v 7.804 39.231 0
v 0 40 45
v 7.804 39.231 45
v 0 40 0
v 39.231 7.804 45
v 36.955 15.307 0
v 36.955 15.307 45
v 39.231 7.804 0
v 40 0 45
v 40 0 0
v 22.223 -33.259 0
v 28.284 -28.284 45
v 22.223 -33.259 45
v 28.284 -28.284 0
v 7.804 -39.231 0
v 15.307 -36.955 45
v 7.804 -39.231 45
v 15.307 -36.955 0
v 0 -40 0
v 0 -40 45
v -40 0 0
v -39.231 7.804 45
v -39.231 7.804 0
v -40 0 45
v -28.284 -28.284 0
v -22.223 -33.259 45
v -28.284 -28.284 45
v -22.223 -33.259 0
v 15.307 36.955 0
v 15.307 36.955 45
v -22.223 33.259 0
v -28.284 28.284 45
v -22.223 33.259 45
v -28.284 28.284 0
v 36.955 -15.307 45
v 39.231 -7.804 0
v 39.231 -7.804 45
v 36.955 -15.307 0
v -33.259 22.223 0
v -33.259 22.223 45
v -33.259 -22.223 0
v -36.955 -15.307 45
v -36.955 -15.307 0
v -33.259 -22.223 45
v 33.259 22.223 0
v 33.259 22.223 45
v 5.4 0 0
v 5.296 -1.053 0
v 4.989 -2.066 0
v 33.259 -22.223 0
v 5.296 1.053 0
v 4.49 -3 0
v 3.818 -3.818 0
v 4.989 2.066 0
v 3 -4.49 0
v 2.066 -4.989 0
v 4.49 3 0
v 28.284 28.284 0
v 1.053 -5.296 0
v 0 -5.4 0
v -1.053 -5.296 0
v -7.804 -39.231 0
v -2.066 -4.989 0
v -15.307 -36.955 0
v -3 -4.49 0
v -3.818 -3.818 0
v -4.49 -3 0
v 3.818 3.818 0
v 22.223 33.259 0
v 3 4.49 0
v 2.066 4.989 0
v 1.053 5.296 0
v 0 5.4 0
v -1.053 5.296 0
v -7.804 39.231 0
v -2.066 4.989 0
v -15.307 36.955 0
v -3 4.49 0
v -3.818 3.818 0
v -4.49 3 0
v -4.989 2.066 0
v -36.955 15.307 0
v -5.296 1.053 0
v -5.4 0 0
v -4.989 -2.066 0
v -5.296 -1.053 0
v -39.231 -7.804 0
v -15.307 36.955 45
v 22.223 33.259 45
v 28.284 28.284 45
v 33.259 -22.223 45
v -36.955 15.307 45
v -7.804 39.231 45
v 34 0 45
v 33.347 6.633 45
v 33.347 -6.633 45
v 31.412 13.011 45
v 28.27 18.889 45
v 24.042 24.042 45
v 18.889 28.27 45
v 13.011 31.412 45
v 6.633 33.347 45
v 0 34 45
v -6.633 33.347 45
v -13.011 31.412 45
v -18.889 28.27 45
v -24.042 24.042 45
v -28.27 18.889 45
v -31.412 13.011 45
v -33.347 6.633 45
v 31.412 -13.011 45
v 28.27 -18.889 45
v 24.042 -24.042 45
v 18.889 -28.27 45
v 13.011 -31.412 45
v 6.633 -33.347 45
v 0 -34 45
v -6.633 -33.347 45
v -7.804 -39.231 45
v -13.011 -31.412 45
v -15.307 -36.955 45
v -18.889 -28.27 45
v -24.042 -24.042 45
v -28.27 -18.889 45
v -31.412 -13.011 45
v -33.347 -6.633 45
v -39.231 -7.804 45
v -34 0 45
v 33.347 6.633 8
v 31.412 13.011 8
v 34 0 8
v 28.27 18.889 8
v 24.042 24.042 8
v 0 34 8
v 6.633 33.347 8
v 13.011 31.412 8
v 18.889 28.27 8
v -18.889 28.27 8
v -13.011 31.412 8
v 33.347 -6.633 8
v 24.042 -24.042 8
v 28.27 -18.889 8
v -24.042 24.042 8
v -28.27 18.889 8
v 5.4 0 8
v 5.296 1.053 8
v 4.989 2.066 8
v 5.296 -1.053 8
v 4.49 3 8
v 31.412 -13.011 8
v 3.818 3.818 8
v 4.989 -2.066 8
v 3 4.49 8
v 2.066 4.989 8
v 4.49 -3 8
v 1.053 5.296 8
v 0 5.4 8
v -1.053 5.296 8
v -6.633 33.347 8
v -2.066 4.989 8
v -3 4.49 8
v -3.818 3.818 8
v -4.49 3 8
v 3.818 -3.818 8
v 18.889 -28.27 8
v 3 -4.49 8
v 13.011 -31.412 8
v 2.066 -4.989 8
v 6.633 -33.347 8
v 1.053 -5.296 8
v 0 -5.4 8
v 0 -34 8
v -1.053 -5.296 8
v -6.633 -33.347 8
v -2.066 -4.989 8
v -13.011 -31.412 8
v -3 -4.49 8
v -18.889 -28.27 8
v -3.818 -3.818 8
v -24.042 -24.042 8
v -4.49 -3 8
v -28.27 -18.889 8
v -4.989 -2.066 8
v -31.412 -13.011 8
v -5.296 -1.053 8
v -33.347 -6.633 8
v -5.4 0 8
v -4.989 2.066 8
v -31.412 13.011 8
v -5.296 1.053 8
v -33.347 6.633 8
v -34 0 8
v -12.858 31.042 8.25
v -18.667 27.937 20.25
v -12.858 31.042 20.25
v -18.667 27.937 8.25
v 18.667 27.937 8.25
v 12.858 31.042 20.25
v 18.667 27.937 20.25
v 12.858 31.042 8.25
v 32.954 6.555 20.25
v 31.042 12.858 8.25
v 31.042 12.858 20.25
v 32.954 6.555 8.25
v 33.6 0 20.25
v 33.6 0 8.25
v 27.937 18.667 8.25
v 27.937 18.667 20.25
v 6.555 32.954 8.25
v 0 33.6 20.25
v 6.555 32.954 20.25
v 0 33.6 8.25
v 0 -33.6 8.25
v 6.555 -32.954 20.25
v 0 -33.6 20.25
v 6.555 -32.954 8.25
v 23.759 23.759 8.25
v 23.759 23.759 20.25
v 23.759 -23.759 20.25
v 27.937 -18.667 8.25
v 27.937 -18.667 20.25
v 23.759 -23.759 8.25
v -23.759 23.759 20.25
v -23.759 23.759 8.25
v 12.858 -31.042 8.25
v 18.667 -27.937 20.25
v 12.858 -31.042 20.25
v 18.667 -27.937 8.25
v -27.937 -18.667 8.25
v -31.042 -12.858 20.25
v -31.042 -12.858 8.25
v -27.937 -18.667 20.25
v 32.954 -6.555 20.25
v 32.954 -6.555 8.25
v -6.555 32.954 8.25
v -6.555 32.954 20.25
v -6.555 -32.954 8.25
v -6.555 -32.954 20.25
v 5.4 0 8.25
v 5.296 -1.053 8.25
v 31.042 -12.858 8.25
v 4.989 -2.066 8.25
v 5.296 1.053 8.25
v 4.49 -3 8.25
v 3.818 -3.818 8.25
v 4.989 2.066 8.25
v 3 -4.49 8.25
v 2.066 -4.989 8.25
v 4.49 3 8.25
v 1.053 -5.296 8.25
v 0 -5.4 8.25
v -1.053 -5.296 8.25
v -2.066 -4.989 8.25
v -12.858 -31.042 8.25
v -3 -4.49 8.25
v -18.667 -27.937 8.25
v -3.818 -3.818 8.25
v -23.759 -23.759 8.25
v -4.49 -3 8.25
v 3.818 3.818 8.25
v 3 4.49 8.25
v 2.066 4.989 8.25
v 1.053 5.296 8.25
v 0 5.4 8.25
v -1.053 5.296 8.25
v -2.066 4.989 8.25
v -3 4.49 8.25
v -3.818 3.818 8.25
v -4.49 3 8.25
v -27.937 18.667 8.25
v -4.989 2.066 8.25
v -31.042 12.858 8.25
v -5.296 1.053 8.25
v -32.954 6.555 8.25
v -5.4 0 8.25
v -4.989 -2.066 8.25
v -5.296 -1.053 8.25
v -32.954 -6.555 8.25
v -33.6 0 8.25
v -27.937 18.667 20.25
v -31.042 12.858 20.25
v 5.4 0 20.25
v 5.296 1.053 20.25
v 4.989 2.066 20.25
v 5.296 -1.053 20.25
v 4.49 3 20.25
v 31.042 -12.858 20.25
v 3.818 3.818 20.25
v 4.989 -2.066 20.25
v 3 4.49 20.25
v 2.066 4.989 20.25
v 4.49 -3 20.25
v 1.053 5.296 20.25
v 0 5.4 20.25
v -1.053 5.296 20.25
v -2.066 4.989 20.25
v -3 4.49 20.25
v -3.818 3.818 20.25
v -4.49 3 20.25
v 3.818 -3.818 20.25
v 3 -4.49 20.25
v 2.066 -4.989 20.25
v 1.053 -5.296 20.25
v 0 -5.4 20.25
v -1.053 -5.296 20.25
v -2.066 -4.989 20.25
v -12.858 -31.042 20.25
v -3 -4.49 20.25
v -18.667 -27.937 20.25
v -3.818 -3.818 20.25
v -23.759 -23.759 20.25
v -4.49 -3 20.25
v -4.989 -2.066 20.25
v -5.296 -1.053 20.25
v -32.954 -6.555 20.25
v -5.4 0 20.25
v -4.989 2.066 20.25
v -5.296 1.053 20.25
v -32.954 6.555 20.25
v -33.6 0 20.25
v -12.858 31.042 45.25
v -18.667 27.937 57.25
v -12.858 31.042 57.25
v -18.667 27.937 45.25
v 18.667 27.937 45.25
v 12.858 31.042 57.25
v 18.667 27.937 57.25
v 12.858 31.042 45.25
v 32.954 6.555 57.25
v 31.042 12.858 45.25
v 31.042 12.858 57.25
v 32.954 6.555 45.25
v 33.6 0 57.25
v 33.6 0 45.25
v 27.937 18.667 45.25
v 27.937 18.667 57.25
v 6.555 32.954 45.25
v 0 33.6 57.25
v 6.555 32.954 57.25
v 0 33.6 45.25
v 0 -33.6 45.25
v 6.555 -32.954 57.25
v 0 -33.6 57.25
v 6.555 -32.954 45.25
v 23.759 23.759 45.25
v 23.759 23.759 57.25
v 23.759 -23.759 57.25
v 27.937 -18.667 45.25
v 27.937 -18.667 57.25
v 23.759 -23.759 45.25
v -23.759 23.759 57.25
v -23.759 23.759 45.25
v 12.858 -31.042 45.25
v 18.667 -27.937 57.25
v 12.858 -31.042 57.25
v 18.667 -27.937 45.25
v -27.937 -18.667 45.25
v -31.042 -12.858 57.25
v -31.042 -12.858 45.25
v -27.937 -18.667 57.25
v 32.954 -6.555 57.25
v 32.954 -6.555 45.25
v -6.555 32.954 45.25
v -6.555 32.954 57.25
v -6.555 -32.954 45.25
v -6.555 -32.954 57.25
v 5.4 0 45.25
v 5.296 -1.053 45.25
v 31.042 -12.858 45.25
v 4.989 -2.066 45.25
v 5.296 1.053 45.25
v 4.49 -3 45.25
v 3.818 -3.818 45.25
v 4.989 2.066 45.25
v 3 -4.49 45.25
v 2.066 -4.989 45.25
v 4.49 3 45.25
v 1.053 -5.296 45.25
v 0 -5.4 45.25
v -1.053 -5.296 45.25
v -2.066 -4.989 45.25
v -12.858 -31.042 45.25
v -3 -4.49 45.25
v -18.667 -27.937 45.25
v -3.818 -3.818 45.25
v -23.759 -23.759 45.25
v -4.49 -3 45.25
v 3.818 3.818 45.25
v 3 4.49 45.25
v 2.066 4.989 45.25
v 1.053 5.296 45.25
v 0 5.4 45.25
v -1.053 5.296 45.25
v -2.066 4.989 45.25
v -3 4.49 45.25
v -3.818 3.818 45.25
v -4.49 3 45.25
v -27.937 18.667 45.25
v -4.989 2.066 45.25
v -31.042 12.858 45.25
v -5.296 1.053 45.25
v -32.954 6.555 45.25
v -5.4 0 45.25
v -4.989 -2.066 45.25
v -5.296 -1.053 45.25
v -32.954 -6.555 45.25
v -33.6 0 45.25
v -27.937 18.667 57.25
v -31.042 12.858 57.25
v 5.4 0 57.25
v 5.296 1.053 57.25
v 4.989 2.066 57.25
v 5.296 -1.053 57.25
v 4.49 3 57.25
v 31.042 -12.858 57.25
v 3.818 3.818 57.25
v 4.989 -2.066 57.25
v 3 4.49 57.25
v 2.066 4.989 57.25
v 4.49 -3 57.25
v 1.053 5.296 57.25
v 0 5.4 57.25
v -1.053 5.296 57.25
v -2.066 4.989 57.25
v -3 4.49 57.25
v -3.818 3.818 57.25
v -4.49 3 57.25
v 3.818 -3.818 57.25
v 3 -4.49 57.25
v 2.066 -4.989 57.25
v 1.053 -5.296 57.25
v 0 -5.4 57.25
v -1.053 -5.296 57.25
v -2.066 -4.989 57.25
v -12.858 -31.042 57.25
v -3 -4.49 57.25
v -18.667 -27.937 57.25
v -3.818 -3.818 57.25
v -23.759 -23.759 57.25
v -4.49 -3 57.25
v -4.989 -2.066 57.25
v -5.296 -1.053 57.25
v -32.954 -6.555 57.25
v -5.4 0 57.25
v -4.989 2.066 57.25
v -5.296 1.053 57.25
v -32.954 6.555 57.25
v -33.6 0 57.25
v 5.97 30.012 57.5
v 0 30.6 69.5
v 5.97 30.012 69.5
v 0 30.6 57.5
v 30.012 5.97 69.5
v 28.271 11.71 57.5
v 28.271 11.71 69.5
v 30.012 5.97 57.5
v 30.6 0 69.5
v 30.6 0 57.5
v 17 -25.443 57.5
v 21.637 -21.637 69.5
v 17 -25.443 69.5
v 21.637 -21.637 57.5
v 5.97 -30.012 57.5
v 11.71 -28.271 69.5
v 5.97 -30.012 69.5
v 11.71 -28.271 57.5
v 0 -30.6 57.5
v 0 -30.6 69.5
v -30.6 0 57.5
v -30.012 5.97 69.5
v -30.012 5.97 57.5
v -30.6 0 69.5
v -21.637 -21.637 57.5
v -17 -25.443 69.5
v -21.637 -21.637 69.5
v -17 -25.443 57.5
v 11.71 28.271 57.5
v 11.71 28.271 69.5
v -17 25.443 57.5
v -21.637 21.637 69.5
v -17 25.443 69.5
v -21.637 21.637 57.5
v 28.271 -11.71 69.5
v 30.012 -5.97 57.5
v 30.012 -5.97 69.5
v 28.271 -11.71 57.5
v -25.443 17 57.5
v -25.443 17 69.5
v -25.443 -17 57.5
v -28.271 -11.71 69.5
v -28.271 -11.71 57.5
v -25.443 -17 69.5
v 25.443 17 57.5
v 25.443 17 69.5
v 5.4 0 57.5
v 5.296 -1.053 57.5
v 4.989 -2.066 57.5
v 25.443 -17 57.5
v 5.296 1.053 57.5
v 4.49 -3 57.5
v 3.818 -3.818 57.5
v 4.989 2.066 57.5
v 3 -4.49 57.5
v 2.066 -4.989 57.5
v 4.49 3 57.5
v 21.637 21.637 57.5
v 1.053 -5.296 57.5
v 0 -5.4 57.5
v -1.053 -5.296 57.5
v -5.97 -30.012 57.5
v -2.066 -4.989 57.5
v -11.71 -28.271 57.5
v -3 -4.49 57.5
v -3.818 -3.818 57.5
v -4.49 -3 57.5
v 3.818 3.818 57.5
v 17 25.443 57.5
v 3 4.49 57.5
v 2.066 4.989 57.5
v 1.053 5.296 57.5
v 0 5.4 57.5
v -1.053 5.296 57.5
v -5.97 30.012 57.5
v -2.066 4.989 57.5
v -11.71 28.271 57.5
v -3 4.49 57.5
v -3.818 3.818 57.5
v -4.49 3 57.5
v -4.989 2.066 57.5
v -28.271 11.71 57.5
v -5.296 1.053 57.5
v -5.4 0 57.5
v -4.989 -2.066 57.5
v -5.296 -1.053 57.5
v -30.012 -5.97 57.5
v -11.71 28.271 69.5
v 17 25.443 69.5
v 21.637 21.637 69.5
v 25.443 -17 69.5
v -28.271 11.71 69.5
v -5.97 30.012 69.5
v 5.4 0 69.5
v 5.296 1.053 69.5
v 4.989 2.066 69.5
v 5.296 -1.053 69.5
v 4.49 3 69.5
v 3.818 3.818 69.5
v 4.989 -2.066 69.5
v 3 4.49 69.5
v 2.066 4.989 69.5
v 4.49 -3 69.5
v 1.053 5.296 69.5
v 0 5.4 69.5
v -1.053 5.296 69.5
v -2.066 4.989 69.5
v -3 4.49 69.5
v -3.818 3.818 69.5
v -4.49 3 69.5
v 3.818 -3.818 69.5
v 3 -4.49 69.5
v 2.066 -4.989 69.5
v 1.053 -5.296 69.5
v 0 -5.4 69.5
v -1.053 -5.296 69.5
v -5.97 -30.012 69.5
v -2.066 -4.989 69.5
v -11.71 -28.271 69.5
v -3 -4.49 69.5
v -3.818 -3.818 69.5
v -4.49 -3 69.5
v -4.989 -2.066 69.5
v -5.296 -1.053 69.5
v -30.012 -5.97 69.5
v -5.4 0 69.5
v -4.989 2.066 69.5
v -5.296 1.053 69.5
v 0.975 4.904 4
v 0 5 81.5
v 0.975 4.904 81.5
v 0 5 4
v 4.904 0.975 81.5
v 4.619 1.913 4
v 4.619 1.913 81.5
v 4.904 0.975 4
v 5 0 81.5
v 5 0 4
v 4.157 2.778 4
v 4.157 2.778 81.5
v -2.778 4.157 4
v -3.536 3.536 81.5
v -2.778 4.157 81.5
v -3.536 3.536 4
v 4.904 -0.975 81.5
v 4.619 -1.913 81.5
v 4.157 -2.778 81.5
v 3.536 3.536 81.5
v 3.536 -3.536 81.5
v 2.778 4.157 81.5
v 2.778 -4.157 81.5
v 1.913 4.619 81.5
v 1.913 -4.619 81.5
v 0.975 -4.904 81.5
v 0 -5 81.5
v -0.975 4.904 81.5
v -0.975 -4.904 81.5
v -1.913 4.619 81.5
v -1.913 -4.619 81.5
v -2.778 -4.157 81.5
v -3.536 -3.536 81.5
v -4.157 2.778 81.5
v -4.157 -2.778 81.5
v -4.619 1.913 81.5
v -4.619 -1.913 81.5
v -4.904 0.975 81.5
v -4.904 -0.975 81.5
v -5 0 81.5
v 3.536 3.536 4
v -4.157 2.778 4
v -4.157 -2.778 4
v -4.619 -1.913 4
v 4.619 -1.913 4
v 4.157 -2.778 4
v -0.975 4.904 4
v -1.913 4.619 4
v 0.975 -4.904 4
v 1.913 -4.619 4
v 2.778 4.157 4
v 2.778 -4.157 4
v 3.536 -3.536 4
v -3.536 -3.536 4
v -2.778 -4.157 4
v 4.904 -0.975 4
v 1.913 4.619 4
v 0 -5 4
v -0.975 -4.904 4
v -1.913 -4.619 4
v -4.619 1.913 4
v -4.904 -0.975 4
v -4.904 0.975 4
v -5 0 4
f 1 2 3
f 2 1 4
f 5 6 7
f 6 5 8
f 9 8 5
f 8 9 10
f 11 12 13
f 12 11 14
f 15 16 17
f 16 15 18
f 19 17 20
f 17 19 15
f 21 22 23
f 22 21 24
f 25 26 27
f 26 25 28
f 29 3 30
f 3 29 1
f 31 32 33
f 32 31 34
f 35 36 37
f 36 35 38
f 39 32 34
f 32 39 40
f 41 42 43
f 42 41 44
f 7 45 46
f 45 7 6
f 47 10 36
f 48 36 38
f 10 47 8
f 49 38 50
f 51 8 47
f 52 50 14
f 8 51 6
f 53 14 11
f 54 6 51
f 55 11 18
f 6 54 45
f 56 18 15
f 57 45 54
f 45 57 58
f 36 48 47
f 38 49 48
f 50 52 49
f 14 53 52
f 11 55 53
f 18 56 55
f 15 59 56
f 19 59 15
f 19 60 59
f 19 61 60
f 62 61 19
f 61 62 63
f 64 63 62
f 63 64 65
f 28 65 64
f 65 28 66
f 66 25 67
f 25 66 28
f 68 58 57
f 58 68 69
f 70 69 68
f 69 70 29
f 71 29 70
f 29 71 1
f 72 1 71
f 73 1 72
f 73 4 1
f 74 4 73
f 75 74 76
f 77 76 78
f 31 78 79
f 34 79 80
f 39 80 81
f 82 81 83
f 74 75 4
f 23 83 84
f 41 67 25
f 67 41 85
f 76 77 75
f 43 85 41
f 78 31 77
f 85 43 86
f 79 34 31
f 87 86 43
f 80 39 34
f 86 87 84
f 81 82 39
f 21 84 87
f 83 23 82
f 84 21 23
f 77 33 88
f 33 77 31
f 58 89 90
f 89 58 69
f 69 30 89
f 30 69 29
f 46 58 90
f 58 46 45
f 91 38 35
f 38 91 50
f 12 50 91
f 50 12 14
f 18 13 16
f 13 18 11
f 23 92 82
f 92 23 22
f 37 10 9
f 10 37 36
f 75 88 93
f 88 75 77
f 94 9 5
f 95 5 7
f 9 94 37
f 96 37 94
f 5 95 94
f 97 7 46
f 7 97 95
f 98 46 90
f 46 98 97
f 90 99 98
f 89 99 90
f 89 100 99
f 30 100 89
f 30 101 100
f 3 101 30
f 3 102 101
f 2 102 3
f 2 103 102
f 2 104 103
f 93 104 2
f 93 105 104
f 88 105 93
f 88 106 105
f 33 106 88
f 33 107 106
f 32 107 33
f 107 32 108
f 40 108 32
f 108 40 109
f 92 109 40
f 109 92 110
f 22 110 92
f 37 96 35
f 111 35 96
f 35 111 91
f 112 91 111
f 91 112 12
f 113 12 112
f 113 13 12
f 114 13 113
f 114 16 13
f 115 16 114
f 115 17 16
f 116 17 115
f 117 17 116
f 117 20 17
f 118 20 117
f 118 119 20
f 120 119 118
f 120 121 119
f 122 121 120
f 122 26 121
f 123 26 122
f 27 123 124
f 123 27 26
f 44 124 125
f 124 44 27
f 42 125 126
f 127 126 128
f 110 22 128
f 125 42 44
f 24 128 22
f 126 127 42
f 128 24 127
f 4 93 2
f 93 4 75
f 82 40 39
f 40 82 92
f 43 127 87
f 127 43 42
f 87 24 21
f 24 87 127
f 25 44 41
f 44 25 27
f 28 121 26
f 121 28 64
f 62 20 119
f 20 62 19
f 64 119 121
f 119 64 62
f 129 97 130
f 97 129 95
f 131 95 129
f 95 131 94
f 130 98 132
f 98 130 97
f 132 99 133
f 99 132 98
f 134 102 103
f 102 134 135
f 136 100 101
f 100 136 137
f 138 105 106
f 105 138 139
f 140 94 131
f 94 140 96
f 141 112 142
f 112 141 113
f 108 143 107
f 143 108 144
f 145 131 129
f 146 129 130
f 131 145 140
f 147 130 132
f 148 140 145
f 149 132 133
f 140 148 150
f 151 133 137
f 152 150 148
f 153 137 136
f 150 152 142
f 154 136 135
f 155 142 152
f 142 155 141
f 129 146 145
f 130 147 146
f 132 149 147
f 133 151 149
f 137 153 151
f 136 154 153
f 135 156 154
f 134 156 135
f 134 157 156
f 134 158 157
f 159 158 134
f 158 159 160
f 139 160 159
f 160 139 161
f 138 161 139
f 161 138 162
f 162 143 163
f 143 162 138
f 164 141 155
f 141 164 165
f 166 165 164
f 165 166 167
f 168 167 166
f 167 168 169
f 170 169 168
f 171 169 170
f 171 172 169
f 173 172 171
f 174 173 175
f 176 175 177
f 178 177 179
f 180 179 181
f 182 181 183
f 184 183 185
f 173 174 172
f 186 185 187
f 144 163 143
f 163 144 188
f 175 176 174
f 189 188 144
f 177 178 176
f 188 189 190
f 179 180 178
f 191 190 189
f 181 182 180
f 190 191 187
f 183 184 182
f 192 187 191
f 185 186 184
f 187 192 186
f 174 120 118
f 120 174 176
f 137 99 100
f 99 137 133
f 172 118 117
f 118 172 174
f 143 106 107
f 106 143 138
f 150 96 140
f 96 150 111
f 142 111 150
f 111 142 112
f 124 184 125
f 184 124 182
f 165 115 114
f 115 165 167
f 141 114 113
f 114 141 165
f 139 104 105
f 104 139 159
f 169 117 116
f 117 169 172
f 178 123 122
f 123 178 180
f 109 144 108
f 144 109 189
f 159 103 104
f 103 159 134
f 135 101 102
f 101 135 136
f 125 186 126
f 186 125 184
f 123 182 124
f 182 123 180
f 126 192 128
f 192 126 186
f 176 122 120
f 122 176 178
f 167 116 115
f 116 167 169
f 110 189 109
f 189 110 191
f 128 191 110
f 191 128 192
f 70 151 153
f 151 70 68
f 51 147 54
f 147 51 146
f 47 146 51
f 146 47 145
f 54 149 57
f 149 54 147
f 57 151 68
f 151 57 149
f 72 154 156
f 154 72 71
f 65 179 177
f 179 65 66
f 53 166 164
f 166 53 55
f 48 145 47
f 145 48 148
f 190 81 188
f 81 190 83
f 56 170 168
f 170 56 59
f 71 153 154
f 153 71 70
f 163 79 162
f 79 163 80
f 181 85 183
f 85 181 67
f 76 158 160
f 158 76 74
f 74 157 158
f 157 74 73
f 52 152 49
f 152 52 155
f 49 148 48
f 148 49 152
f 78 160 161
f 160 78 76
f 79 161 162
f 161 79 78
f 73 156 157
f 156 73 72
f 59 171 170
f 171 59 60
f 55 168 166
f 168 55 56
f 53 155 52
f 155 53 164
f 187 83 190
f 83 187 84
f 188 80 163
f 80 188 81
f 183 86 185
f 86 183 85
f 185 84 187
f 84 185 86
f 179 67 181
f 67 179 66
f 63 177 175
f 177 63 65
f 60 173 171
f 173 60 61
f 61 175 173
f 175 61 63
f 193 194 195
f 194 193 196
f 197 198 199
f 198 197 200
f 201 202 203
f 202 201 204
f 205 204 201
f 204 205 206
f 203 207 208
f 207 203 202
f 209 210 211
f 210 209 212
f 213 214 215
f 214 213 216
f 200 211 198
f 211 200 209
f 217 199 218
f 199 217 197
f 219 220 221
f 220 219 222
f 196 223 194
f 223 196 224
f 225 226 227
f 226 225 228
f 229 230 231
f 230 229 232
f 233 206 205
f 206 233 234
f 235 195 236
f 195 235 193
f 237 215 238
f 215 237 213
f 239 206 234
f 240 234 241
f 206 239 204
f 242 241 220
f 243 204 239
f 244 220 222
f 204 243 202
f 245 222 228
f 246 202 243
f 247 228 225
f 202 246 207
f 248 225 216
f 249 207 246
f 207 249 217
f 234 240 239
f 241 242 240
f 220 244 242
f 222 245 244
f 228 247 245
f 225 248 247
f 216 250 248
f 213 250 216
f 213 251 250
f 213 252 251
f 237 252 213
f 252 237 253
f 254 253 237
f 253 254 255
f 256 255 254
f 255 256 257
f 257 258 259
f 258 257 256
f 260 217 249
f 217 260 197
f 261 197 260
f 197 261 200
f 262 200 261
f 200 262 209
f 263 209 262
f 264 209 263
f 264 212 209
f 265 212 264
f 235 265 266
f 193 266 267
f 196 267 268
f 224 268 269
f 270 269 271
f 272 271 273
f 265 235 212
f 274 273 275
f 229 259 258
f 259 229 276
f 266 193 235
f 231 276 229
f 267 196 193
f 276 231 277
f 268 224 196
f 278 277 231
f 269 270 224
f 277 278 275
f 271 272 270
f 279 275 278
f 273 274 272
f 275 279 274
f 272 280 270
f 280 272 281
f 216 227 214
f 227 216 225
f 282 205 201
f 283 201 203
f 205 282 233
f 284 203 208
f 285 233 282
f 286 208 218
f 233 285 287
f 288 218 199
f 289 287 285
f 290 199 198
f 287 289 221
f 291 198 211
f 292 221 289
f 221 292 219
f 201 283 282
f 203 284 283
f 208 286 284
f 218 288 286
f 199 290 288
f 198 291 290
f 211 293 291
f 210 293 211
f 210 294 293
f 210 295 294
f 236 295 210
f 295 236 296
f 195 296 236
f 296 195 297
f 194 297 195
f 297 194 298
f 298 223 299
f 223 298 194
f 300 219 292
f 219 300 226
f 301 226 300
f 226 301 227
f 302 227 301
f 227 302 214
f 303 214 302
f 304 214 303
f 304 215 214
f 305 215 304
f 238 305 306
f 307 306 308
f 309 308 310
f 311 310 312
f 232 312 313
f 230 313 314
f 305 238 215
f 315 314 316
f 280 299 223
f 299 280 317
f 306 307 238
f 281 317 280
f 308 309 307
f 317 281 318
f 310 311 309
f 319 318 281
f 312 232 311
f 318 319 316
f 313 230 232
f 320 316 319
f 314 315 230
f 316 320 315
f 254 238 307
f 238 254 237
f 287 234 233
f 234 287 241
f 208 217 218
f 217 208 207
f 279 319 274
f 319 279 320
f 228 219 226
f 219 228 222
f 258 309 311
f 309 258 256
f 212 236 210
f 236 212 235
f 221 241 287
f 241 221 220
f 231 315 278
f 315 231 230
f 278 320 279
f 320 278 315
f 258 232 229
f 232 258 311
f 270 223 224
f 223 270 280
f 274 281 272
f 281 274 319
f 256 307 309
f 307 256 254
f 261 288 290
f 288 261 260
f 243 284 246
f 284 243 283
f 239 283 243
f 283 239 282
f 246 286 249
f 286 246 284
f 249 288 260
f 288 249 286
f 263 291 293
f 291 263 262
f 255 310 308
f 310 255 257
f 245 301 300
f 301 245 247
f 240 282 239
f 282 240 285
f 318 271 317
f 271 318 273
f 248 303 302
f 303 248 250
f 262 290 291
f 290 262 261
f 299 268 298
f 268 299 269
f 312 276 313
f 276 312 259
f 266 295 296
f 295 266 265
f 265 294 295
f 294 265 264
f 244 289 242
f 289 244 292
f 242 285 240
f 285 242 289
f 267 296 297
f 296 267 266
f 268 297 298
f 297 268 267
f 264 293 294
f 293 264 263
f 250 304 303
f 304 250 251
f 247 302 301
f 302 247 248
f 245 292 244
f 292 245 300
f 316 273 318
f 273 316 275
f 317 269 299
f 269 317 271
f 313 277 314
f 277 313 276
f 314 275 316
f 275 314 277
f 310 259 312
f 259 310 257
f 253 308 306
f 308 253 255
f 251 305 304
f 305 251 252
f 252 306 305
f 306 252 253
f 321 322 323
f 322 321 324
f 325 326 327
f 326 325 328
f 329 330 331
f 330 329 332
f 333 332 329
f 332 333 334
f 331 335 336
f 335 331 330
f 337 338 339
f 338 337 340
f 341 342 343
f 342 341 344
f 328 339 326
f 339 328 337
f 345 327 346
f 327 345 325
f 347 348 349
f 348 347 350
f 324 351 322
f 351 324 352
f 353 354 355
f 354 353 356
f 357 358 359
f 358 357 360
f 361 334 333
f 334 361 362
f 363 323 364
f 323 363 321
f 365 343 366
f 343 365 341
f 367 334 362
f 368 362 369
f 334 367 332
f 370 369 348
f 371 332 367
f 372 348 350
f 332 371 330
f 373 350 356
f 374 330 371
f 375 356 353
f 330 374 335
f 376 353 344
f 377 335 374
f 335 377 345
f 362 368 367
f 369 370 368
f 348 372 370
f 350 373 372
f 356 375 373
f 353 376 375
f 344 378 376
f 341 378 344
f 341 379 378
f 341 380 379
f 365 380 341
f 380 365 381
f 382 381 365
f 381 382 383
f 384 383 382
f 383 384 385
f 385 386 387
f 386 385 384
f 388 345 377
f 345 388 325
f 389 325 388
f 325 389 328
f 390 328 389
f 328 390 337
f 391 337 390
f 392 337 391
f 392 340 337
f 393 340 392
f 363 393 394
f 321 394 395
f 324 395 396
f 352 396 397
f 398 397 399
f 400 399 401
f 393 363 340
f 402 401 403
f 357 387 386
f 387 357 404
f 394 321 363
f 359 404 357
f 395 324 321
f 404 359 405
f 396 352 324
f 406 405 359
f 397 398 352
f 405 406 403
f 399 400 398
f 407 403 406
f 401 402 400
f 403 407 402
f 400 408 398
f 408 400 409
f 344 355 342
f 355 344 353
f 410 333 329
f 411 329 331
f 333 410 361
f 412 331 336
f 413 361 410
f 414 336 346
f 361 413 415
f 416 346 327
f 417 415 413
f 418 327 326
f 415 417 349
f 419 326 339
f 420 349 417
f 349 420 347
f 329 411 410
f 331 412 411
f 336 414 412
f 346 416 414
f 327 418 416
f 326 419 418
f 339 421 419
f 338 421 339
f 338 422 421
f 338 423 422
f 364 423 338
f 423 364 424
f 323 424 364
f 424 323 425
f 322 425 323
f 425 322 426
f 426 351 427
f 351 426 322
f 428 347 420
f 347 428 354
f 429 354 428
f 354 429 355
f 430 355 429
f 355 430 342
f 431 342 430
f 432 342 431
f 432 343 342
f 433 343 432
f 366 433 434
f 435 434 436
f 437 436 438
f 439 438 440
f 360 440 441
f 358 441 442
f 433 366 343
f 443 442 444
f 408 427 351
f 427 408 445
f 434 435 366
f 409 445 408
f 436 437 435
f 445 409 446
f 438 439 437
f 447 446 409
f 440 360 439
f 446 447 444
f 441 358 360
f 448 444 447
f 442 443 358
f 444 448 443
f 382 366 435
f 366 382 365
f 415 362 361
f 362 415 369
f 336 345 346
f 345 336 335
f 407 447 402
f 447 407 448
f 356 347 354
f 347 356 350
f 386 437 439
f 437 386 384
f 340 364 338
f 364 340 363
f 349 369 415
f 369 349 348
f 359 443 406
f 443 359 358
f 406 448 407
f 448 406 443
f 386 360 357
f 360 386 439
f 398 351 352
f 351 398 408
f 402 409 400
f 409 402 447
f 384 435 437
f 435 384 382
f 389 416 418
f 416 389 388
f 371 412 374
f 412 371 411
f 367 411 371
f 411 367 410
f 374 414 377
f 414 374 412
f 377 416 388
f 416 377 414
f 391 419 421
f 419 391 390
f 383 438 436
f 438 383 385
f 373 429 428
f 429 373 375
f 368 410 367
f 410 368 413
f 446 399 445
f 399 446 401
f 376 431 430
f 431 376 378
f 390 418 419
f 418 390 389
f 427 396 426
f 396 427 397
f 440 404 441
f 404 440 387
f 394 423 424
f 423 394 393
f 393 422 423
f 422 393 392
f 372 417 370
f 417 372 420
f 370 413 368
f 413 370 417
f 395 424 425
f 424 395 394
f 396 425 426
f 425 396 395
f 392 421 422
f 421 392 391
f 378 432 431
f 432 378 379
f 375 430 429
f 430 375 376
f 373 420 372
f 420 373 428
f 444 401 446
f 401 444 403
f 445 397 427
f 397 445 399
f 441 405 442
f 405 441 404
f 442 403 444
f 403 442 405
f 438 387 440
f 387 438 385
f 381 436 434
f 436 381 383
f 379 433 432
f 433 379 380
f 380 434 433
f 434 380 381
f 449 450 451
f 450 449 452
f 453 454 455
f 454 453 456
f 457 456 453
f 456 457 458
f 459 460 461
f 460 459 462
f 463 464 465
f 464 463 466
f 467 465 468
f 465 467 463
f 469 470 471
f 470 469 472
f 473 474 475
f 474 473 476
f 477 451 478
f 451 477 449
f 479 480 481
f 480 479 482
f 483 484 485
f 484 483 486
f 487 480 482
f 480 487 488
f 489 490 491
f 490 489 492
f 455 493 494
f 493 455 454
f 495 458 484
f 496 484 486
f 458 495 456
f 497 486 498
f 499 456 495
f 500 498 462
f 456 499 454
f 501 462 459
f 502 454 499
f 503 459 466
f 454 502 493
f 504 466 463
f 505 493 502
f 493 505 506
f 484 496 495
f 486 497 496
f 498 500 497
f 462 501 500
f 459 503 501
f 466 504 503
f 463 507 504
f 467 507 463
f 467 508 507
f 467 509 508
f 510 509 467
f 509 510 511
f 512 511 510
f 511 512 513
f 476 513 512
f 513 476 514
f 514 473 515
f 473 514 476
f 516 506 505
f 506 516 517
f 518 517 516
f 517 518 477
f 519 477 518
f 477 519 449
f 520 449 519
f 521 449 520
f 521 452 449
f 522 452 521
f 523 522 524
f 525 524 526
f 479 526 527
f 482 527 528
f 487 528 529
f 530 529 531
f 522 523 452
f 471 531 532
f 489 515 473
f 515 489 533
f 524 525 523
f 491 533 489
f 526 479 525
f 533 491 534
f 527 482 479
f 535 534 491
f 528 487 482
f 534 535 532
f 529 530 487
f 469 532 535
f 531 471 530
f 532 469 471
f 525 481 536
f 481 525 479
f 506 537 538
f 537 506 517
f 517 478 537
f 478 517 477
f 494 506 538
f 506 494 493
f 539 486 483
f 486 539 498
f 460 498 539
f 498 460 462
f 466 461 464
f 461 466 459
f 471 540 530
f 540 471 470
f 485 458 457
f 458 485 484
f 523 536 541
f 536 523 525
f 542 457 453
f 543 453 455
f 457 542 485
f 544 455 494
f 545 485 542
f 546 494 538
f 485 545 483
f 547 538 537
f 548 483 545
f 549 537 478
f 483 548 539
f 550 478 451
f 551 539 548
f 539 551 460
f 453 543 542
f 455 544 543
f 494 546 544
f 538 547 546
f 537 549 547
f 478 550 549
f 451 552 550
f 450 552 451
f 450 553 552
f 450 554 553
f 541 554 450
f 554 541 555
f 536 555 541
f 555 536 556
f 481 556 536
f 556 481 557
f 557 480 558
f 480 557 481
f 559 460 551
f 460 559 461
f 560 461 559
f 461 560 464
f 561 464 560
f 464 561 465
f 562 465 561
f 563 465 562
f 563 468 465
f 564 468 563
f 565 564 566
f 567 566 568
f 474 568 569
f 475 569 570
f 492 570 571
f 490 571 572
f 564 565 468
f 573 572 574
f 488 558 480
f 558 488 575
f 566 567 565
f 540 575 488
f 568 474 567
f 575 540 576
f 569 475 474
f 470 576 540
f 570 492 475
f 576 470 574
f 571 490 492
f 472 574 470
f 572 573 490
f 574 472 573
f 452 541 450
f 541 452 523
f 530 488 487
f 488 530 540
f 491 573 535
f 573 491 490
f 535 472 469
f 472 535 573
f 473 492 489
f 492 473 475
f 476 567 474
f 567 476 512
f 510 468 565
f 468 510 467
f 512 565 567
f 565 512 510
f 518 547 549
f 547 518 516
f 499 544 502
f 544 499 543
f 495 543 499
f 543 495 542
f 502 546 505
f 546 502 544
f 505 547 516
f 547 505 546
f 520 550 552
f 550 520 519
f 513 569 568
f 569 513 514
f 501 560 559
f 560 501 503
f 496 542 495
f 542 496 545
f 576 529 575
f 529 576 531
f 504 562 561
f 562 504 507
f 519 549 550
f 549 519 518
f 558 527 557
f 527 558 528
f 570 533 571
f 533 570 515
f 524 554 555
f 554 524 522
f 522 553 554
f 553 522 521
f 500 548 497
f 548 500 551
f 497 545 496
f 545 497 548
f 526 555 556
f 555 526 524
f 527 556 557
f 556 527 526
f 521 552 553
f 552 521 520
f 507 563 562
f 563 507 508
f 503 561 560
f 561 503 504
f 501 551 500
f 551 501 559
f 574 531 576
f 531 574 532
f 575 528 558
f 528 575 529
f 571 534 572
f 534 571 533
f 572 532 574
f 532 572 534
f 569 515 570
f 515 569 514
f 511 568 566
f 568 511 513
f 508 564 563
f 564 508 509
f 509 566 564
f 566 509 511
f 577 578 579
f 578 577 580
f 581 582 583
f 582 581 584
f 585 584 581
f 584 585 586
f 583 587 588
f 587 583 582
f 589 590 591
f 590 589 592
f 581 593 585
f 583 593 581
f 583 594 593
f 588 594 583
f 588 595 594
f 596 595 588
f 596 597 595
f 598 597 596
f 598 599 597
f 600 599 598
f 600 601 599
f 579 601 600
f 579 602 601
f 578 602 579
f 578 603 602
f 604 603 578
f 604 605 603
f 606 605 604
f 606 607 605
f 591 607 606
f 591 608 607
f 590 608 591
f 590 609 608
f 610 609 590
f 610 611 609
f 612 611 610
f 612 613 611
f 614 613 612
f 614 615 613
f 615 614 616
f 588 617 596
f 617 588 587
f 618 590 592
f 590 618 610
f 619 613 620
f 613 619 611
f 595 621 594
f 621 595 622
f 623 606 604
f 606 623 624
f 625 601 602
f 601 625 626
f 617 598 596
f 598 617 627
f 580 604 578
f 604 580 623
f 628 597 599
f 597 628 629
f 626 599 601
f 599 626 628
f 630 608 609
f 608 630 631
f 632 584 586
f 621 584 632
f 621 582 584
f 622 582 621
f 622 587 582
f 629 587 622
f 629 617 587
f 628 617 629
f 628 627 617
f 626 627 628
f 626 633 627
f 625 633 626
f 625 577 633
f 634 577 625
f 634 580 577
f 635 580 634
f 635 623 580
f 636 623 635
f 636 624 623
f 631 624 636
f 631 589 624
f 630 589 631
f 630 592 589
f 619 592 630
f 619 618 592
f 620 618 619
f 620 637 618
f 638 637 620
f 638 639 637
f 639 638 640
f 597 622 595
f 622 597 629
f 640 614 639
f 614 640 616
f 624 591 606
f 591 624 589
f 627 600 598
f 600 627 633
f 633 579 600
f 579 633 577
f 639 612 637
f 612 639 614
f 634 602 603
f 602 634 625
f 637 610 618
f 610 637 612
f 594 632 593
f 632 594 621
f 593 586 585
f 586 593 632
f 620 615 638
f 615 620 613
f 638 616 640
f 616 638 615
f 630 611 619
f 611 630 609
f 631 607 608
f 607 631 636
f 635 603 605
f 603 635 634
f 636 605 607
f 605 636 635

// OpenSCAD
$fn = 32;

// ------------------------------------------------------------------------
// Bearing housing: housing d80, two bearings and a shaft
// Every part is its own module, assembly() places them once.
// ------------------------------------------------------------------------

// --- part 1 ---
module housing() {
  difference() {
    cylinder(h = 45, d = 80);
    translate([0, 0, 8]) cylinder(h = 38, d = 68);
    translate([0, 0, -1]) cylinder(h = 10, d = 10.8);
  }
}

// --- part 2 ---
module bearing_lower() {
  difference() {
      translate([0, 0, 0]) cylinder(h = 12, d = 67.2);
      translate([0, 0, -1]) cylinder(h = 14, d = 10.8);
    }
}

// --- part 3 ---
module bearing_upper() {
  difference() {
      translate([0, 0, 0]) cylinder(h = 12, d = 67.2);
      translate([0, 0, -1]) cylinder(h = 14, d = 10.8);
    }
}

// --- part 4 ---
module spacer() {
  difference() {
      translate([0, 0, 0]) cylinder(h = 12, d = 61.2);
      translate([0, 0, -1]) cylinder(h = 14, d = 10.8);
    }
}

// --- part 5 ---
module shaft() {
  translate([0, 0, -38.75]) cylinder(h = 77.5, d = 10);
}

// --- assembly ---
module assembly() {
  translate([0, 0, 0]) rotate([0, 0, 0]) housing();
  translate([0, 0, 8.25]) rotate([0, 0, 0]) bearing_lower();
  translate([0, 0, 45.25]) rotate([0, 0, 0]) bearing_upper();
  translate([0, 0, 57.5]) rotate([0, 0, 0]) spacer();
  translate([0, 0, 42.75]) rotate([0, 0, 0]) shaft();
}

assembly();
